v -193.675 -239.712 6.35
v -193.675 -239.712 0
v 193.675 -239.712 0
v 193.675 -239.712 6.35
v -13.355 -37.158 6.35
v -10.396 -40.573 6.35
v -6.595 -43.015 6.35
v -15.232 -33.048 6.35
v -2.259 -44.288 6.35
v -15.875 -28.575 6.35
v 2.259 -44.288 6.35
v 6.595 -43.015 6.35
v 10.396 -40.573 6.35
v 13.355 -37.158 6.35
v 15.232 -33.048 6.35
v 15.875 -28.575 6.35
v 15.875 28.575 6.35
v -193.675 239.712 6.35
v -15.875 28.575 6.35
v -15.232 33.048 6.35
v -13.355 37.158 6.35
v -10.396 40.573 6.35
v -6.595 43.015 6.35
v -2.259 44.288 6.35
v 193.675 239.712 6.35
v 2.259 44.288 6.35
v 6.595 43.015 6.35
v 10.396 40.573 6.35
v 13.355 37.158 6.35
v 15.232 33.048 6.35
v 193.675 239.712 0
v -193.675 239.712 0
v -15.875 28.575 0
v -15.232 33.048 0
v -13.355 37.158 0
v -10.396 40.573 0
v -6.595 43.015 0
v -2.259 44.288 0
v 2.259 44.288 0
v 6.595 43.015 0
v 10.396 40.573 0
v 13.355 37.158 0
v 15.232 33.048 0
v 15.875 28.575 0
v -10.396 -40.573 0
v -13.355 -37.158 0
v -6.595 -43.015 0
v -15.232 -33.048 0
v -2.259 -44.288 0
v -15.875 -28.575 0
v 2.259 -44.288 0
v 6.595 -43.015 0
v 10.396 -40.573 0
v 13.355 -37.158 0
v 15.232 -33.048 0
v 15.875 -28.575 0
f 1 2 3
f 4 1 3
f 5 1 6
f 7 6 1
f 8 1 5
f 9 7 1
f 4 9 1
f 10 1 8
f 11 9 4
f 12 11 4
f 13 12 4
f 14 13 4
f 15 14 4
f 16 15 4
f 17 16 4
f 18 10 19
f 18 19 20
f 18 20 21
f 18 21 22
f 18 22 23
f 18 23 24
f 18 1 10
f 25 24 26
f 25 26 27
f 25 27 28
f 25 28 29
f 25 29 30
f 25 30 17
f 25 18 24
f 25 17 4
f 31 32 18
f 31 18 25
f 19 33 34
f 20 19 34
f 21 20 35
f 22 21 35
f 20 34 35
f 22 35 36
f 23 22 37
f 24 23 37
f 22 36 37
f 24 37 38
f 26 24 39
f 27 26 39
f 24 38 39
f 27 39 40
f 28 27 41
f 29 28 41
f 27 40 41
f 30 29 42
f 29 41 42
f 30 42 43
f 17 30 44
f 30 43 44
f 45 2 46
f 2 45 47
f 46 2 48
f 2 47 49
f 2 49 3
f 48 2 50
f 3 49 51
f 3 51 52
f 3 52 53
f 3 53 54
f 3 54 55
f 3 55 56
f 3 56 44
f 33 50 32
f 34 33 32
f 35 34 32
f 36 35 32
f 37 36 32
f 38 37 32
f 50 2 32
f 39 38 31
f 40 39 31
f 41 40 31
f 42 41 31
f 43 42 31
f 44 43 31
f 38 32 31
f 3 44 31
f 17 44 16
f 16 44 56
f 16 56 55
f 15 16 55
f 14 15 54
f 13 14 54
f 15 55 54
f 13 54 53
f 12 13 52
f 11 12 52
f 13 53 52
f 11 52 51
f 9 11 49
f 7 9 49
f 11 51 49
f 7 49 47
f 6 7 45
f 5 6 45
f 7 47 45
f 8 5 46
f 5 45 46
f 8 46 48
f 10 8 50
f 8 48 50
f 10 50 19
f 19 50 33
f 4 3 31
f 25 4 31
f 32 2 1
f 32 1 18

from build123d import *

# Parameters (mm, degrees)
F0_W     = 387.35
F0_H     = 479.425
F1_DEPTH = 6.35


with BuildPart() as f1:
    # F0 (on Top) → F1 (new body)
    with BuildSketch(Plane.XY):
        Rectangle(F0_W, F0_H)
        with BuildLine():
            Line((-15.875, -28.575), (-15.875, 28.575))
            ThreePointArc((-15.875, 28.575), (0, 44.45), (15.875, 28.575))
            Line((15.875, 28.575), (15.875, -28.575))
            ThreePointArc((15.875, -28.575), (0, -44.45), (-15.875, -28.575))
        make_face(mode=Mode.SUBTRACT)
    extrude(amount=F1_DEPTH)


solid = f1.part
